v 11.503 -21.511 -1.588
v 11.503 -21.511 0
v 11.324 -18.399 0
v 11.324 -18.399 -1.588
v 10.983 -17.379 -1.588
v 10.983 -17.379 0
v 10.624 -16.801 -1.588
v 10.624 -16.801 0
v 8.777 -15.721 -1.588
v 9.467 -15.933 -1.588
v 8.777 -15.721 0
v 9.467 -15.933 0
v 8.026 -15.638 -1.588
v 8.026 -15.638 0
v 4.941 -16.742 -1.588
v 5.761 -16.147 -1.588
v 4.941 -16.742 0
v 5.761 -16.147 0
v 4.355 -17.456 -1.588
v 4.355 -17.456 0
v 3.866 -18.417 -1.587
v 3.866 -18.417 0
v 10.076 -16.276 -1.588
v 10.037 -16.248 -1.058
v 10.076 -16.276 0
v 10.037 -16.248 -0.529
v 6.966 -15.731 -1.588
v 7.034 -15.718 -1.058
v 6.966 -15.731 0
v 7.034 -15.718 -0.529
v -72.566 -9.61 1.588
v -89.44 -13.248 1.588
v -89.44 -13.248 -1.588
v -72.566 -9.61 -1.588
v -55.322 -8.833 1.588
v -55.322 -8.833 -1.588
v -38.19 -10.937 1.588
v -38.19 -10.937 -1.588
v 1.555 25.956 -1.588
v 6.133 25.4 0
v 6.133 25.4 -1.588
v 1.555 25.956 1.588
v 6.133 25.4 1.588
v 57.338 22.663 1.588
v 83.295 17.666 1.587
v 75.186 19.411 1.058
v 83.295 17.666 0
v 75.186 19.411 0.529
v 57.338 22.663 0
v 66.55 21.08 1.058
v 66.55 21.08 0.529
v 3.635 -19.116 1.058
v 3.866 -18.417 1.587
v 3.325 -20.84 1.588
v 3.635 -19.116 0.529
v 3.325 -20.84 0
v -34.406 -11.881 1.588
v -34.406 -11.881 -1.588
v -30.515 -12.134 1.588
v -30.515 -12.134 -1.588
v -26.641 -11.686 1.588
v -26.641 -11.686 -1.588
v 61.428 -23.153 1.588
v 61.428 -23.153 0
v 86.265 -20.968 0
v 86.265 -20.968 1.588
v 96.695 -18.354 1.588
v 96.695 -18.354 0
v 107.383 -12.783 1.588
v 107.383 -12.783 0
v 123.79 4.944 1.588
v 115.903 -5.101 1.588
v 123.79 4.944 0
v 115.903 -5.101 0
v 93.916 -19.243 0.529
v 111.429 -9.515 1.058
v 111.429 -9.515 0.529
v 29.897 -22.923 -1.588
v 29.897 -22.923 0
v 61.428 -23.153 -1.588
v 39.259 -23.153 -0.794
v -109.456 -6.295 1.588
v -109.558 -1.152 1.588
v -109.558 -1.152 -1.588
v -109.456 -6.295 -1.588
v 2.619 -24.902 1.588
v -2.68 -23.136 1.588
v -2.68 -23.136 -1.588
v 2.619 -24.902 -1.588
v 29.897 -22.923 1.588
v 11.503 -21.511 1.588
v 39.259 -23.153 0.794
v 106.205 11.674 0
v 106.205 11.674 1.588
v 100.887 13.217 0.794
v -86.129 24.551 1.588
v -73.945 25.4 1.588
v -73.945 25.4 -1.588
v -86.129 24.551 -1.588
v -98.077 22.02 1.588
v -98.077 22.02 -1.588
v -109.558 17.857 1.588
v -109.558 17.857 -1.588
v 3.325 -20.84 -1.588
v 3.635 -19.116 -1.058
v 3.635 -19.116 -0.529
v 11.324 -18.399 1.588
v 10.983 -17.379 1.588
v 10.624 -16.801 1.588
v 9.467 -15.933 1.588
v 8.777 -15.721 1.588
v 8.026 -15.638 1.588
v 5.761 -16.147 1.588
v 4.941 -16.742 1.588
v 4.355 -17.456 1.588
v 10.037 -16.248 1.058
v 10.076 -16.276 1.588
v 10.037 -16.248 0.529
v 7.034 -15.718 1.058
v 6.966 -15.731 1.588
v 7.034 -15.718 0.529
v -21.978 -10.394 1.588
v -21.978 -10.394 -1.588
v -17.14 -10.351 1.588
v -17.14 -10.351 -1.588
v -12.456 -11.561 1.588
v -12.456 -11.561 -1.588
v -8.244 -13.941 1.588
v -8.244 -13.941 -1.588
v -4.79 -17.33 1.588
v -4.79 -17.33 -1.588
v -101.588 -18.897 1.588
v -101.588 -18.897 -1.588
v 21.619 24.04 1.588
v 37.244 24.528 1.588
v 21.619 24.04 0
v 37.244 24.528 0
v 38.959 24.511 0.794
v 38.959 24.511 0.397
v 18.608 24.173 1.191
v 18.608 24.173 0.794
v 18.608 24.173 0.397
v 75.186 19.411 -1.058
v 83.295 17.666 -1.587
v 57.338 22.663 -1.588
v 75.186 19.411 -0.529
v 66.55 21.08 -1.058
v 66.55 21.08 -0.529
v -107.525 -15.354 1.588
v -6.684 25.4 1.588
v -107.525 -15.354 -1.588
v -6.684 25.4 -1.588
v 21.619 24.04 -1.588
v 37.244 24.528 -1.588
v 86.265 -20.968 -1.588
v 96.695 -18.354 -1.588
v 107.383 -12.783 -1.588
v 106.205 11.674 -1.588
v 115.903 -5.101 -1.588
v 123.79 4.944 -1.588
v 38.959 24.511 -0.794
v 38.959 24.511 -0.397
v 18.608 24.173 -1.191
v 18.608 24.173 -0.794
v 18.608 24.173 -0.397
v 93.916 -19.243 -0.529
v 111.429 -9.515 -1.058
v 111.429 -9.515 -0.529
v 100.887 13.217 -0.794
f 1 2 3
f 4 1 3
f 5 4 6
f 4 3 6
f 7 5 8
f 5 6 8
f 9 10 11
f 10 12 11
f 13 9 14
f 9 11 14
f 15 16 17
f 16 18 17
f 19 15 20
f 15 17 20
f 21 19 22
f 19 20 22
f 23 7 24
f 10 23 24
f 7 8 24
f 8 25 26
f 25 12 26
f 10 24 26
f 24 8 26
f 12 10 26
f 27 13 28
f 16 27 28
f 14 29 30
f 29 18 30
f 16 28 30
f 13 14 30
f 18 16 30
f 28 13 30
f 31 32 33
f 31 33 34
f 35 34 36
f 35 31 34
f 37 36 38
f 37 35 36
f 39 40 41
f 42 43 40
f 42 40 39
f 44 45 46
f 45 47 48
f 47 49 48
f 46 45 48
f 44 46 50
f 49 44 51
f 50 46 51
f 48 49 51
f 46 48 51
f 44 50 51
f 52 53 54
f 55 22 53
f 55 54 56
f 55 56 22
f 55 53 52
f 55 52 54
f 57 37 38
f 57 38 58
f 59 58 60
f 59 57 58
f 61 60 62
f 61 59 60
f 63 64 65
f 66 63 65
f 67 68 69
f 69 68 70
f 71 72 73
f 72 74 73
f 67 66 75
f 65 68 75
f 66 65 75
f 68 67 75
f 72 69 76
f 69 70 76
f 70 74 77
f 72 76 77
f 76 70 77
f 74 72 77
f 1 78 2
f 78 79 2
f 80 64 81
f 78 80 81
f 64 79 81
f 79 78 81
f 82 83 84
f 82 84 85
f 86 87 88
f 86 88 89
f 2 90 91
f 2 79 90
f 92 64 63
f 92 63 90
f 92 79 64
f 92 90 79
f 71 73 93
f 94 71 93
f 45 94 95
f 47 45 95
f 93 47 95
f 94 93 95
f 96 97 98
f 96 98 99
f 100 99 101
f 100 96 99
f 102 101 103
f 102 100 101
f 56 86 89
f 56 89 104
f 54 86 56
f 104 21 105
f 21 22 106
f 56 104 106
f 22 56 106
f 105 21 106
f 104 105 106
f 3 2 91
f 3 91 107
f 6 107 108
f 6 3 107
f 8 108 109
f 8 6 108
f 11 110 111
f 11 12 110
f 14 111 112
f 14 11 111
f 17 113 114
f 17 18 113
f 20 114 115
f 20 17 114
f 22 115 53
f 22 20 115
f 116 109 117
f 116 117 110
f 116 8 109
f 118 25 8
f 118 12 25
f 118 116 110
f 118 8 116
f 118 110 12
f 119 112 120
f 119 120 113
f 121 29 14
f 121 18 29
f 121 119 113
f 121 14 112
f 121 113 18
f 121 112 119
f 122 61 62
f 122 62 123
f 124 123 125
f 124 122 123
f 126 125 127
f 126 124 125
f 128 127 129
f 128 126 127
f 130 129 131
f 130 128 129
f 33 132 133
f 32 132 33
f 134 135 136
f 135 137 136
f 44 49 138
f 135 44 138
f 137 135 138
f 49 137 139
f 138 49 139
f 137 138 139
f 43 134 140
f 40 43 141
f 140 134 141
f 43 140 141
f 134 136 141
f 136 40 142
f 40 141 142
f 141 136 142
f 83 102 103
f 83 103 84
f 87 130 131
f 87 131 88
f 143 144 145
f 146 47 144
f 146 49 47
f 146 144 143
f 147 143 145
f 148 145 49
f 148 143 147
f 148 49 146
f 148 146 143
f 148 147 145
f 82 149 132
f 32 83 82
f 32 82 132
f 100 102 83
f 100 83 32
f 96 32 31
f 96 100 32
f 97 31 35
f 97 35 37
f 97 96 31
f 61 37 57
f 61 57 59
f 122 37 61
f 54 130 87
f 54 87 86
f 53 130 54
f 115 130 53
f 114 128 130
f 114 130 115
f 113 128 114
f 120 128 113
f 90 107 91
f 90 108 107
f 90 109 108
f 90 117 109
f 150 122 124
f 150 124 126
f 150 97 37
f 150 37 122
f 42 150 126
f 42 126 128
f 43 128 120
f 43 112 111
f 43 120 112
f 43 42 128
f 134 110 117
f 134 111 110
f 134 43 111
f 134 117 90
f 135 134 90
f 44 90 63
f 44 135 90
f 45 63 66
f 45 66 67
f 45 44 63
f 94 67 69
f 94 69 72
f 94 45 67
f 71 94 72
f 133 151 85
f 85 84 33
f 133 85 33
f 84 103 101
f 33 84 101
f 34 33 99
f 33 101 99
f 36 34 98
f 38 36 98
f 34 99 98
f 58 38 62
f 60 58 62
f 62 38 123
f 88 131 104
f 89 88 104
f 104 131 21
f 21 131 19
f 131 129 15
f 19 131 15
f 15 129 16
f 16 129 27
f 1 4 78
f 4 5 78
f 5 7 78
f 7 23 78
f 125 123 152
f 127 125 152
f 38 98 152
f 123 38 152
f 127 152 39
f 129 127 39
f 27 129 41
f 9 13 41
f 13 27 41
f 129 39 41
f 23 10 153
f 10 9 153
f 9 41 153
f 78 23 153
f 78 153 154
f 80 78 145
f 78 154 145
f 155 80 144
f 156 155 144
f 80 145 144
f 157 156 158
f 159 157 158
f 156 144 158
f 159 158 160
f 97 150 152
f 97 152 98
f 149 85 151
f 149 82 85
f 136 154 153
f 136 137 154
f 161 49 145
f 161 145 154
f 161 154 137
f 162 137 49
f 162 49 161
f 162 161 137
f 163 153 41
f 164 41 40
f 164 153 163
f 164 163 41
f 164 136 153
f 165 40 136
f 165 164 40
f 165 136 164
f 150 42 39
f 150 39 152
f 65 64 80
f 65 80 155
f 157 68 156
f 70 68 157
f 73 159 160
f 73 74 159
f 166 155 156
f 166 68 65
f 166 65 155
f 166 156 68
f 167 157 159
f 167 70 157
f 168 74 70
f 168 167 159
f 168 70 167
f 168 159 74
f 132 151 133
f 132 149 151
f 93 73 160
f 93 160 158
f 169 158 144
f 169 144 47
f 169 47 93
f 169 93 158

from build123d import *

# Parameters (mm, degrees)
F1_DEPTH      = 1.5875
F2_DEPTH      = 1.5875
F3_DEPTH      = 1.5875
F3_DEPTH_BACK = 1.5875


with BuildPart() as f1:
    # F0 (on Top) → F1 (new body)
    with BuildSketch(Plane.XY):
        with BuildLine():
            Line((-101.5884131193, -18.8973024487), (-89.4398242235, -13.247538358))
            ThreePointArc((-89.4398242235, -13.247538358), (-63.9605427044, -8.860636447), (-38.1898805499, -10.9370918944))
            ThreePointArc((-38.1898805499, -10.9370918944), (-32.4660196125, -12.0949158123), (-26.640561875, -11.6860363632))
            ThreePointArc((-26.640561875, -11.6860363632), (-14.7586255851, -10.8029487579), (-4.7904760577, -17.3295289278))
            Line((-4.7904760577, -17.3295289278), (-2.6797975879, -23.1362432241))
            Line((-2.6797975879, -23.1362432241), (2.6188781485, -24.9024685472))
            Line((2.6188781485, -24.9024685472), (3.3253682777, -20.8401493728))
            add(Edge.make_bspline(
                [(3.8662650694, -18.4174778796), (3.611906377, -19.0656781935), (3.4231723145, -19.8621077155), (3.3253682777, -20.8401493728)],
                knots=[0.9006018819, 0.9006018819, 0.9006018819, 0.9006018819, 1, 1, 1, 1], degree=3))
            ThreePointArc((3.8662650694, -18.4174778796), (9.6420642738, -2.2568424674), (17.1927238868, 13.1546315953))
            add(Edge.make_bspline(
                [(19.2337166518, 14.6902082488), (18.6318591554, 14.4187646386), (17.59365201, 13.7314004824), (17.1927238868, 13.1546315953)],
                knots=[0, 0, 0, 0, 2.5541431294, 2.5541431294, 2.5541431294, 2.5541431294], degree=3))
            add(Edge.make_bspline(
                [(83.2952766221, 17.6661035357), (80.4809135378, 16.6286477767), (74.7370679332, 14.5111030682), (64.3408485466, 15.5369801541), (53.4850420824, 16.9731062249), (39.4603352069, 19.1405437268), (27.191213055, 18.2323443266), (21.8879047106, 15.9122857049), (19.2337166518, 14.6902082488)],
                knots=[0, 0, 0, 0, 0.1519877595, 0.3134001461, 0.4827768067, 0.6751193638, 0.8516699299, 1, 1, 1, 1], degree=3))
            add(Edge.make_bspline(
                [(83.2952766221, 17.6661035357), (75.4343407531, 19.4467237762), (66.8526441437, 21.1255448484), (57.3383793235, 22.663006559)],
                knots=[0.6805820288, 0.6805820288, 0.6805820288, 0.6805820288, 1, 1, 1, 1], degree=3))
            add(Edge.make_bspline(
                [(57.3383793235, 22.663006559), (51.3860041145, 23.5646728097), (39.5545116639, 25.1027234946), (25.1310915838, 23.9086109925), (18.7821781751, 24.0979107297), (10.2035533763, 24.7548514651), (6.1330744065, 25.4)],
                knots=[0, 0, 0, 0, 0.3045684162, 0.5682644154, 0.7491025184, 1, 1, 1, 1], degree=3))
            Line((6.1330744065, 25.4), (1.5553526144, 25.95639154))
            Line((1.5553526144, 25.95639154), (-6.6837654449, 25.4))
            Line((-6.6837654449, 25.4), (-20.9665372968, 25.4))
            Line((-20.9665372968, 25.4), (-73.9454105496, 25.4))
            ThreePointArc((-73.9454105496, 25.4), (-92.1467392312, 23.4934617336), (-109.5579192042, 17.8566128016))
            Line((-109.5579192042, 17.8566128016), (-109.5579192042, -1.152076642))
            Line((-109.5579192042, -1.152076642), (-109.4557195902, -6.2945531681))
            Line((-109.4557195902, -6.2945531681), (-107.5249388814, -15.3543483466))
            Line((-107.5249388814, -15.3543483466), (-101.5884131193, -18.8973024487))
        make_face()
    extrude(amount=F1_DEPTH)

    # F2 (add): a face of the model
    f2_faces = [f1.faces().sort_by_distance(p)[0] for p in [
        (-39.6121775227, 7.2978383867, 0),
    ]]
    extrude(f2_faces, amount=F2_DEPTH)

    # F0 (on Top) → F3 (join, two sides)
    with BuildSketch(Plane.XY) as f3_sk:
        with BuildLine():
            ThreePointArc((17.1927238868, 13.1546315953), (9.6420642738, -2.2568424674), (3.8662650694, -18.4174778796))
            add(Edge.make_bspline(
                [(11.5028988087, -21.510926818), (11.6403456009, -18.4112889852), (10.6938808175, -15.9301904115), (7.0077218043, -15.3266314496), (4.5871981853, -16.580272839), (3.8662650694, -18.4174778796)],
                knots=[0, 0, 0, 0, 0.354240575, 0.6188761258, 0.9006018819, 0.9006018819, 0.9006018819, 0.9006018819], degree=3))
            add(Edge.make_bspline(
                [(61.4279137712, -23.1528356665), (55.5369847146, -23.2709089404), (40.3623363295, -23.3563614522), (16.3717952101, -22.5488794213), (11.5028988087, -21.510926818)],
                knots=[0, 0, 0, 0, 0.4717155518, 1, 1, 1, 1], degree=3))
            add(Edge.make_bspline(
                [(61.4279137712, -23.1528356665), (69.7385266657, -23.0155210755), (95.0642582897, -21.4162605515), (111.9931118186, -10.1613653445), (119.5524930257, -1.1537255666), (123.7895080587, 4.9438558941)],
                knots=[0, 0, 0, 0, 0.3929440031, 0.7004054275, 1, 1, 1, 1], degree=3))
            add(Edge.make_bspline(
                [(123.7895080587, 4.9438558941), (118.1227580639, 7.9880751421), (105.1050021221, 12.2740321559), (89.5844015046, 16.2415221313), (83.2952766221, 17.6661035357)],
                knots=[0, 0, 0, 0, 0.425032366, 0.6805820288, 0.6805820288, 0.6805820288, 0.6805820288], degree=3))
            add(Edge.make_bspline(
                [(83.2952766221, 17.6661035357), (80.4809135378, 16.6286477767), (74.7370679332, 14.5111030682), (64.3408485466, 15.5369801541), (53.4850420824, 16.9731062249), (39.4603352069, 19.1405437268), (27.191213055, 18.2323443266), (21.8879047106, 15.9122857049), (19.2337166518, 14.6902082488)],
                knots=[0, 0, 0, 0, 0.1519877595, 0.3134001461, 0.4827768067, 0.6751193638, 0.8516699299, 1, 1, 1, 1], degree=3))
            add(Edge.make_bspline(
                [(19.2337166518, 14.6902082488), (18.6318591554, 14.4187646386), (17.59365201, 13.7314004824), (17.1927238868, 13.1546315953)],
                knots=[0, 0, 0, 0, 2.5541431294, 2.5541431294, 2.5541431294, 2.5541431294], degree=3))
        make_face()
    extrude(amount=F3_DEPTH)
    extrude(f3_sk.sketch, amount=-F3_DEPTH_BACK)


solid = f1.part
